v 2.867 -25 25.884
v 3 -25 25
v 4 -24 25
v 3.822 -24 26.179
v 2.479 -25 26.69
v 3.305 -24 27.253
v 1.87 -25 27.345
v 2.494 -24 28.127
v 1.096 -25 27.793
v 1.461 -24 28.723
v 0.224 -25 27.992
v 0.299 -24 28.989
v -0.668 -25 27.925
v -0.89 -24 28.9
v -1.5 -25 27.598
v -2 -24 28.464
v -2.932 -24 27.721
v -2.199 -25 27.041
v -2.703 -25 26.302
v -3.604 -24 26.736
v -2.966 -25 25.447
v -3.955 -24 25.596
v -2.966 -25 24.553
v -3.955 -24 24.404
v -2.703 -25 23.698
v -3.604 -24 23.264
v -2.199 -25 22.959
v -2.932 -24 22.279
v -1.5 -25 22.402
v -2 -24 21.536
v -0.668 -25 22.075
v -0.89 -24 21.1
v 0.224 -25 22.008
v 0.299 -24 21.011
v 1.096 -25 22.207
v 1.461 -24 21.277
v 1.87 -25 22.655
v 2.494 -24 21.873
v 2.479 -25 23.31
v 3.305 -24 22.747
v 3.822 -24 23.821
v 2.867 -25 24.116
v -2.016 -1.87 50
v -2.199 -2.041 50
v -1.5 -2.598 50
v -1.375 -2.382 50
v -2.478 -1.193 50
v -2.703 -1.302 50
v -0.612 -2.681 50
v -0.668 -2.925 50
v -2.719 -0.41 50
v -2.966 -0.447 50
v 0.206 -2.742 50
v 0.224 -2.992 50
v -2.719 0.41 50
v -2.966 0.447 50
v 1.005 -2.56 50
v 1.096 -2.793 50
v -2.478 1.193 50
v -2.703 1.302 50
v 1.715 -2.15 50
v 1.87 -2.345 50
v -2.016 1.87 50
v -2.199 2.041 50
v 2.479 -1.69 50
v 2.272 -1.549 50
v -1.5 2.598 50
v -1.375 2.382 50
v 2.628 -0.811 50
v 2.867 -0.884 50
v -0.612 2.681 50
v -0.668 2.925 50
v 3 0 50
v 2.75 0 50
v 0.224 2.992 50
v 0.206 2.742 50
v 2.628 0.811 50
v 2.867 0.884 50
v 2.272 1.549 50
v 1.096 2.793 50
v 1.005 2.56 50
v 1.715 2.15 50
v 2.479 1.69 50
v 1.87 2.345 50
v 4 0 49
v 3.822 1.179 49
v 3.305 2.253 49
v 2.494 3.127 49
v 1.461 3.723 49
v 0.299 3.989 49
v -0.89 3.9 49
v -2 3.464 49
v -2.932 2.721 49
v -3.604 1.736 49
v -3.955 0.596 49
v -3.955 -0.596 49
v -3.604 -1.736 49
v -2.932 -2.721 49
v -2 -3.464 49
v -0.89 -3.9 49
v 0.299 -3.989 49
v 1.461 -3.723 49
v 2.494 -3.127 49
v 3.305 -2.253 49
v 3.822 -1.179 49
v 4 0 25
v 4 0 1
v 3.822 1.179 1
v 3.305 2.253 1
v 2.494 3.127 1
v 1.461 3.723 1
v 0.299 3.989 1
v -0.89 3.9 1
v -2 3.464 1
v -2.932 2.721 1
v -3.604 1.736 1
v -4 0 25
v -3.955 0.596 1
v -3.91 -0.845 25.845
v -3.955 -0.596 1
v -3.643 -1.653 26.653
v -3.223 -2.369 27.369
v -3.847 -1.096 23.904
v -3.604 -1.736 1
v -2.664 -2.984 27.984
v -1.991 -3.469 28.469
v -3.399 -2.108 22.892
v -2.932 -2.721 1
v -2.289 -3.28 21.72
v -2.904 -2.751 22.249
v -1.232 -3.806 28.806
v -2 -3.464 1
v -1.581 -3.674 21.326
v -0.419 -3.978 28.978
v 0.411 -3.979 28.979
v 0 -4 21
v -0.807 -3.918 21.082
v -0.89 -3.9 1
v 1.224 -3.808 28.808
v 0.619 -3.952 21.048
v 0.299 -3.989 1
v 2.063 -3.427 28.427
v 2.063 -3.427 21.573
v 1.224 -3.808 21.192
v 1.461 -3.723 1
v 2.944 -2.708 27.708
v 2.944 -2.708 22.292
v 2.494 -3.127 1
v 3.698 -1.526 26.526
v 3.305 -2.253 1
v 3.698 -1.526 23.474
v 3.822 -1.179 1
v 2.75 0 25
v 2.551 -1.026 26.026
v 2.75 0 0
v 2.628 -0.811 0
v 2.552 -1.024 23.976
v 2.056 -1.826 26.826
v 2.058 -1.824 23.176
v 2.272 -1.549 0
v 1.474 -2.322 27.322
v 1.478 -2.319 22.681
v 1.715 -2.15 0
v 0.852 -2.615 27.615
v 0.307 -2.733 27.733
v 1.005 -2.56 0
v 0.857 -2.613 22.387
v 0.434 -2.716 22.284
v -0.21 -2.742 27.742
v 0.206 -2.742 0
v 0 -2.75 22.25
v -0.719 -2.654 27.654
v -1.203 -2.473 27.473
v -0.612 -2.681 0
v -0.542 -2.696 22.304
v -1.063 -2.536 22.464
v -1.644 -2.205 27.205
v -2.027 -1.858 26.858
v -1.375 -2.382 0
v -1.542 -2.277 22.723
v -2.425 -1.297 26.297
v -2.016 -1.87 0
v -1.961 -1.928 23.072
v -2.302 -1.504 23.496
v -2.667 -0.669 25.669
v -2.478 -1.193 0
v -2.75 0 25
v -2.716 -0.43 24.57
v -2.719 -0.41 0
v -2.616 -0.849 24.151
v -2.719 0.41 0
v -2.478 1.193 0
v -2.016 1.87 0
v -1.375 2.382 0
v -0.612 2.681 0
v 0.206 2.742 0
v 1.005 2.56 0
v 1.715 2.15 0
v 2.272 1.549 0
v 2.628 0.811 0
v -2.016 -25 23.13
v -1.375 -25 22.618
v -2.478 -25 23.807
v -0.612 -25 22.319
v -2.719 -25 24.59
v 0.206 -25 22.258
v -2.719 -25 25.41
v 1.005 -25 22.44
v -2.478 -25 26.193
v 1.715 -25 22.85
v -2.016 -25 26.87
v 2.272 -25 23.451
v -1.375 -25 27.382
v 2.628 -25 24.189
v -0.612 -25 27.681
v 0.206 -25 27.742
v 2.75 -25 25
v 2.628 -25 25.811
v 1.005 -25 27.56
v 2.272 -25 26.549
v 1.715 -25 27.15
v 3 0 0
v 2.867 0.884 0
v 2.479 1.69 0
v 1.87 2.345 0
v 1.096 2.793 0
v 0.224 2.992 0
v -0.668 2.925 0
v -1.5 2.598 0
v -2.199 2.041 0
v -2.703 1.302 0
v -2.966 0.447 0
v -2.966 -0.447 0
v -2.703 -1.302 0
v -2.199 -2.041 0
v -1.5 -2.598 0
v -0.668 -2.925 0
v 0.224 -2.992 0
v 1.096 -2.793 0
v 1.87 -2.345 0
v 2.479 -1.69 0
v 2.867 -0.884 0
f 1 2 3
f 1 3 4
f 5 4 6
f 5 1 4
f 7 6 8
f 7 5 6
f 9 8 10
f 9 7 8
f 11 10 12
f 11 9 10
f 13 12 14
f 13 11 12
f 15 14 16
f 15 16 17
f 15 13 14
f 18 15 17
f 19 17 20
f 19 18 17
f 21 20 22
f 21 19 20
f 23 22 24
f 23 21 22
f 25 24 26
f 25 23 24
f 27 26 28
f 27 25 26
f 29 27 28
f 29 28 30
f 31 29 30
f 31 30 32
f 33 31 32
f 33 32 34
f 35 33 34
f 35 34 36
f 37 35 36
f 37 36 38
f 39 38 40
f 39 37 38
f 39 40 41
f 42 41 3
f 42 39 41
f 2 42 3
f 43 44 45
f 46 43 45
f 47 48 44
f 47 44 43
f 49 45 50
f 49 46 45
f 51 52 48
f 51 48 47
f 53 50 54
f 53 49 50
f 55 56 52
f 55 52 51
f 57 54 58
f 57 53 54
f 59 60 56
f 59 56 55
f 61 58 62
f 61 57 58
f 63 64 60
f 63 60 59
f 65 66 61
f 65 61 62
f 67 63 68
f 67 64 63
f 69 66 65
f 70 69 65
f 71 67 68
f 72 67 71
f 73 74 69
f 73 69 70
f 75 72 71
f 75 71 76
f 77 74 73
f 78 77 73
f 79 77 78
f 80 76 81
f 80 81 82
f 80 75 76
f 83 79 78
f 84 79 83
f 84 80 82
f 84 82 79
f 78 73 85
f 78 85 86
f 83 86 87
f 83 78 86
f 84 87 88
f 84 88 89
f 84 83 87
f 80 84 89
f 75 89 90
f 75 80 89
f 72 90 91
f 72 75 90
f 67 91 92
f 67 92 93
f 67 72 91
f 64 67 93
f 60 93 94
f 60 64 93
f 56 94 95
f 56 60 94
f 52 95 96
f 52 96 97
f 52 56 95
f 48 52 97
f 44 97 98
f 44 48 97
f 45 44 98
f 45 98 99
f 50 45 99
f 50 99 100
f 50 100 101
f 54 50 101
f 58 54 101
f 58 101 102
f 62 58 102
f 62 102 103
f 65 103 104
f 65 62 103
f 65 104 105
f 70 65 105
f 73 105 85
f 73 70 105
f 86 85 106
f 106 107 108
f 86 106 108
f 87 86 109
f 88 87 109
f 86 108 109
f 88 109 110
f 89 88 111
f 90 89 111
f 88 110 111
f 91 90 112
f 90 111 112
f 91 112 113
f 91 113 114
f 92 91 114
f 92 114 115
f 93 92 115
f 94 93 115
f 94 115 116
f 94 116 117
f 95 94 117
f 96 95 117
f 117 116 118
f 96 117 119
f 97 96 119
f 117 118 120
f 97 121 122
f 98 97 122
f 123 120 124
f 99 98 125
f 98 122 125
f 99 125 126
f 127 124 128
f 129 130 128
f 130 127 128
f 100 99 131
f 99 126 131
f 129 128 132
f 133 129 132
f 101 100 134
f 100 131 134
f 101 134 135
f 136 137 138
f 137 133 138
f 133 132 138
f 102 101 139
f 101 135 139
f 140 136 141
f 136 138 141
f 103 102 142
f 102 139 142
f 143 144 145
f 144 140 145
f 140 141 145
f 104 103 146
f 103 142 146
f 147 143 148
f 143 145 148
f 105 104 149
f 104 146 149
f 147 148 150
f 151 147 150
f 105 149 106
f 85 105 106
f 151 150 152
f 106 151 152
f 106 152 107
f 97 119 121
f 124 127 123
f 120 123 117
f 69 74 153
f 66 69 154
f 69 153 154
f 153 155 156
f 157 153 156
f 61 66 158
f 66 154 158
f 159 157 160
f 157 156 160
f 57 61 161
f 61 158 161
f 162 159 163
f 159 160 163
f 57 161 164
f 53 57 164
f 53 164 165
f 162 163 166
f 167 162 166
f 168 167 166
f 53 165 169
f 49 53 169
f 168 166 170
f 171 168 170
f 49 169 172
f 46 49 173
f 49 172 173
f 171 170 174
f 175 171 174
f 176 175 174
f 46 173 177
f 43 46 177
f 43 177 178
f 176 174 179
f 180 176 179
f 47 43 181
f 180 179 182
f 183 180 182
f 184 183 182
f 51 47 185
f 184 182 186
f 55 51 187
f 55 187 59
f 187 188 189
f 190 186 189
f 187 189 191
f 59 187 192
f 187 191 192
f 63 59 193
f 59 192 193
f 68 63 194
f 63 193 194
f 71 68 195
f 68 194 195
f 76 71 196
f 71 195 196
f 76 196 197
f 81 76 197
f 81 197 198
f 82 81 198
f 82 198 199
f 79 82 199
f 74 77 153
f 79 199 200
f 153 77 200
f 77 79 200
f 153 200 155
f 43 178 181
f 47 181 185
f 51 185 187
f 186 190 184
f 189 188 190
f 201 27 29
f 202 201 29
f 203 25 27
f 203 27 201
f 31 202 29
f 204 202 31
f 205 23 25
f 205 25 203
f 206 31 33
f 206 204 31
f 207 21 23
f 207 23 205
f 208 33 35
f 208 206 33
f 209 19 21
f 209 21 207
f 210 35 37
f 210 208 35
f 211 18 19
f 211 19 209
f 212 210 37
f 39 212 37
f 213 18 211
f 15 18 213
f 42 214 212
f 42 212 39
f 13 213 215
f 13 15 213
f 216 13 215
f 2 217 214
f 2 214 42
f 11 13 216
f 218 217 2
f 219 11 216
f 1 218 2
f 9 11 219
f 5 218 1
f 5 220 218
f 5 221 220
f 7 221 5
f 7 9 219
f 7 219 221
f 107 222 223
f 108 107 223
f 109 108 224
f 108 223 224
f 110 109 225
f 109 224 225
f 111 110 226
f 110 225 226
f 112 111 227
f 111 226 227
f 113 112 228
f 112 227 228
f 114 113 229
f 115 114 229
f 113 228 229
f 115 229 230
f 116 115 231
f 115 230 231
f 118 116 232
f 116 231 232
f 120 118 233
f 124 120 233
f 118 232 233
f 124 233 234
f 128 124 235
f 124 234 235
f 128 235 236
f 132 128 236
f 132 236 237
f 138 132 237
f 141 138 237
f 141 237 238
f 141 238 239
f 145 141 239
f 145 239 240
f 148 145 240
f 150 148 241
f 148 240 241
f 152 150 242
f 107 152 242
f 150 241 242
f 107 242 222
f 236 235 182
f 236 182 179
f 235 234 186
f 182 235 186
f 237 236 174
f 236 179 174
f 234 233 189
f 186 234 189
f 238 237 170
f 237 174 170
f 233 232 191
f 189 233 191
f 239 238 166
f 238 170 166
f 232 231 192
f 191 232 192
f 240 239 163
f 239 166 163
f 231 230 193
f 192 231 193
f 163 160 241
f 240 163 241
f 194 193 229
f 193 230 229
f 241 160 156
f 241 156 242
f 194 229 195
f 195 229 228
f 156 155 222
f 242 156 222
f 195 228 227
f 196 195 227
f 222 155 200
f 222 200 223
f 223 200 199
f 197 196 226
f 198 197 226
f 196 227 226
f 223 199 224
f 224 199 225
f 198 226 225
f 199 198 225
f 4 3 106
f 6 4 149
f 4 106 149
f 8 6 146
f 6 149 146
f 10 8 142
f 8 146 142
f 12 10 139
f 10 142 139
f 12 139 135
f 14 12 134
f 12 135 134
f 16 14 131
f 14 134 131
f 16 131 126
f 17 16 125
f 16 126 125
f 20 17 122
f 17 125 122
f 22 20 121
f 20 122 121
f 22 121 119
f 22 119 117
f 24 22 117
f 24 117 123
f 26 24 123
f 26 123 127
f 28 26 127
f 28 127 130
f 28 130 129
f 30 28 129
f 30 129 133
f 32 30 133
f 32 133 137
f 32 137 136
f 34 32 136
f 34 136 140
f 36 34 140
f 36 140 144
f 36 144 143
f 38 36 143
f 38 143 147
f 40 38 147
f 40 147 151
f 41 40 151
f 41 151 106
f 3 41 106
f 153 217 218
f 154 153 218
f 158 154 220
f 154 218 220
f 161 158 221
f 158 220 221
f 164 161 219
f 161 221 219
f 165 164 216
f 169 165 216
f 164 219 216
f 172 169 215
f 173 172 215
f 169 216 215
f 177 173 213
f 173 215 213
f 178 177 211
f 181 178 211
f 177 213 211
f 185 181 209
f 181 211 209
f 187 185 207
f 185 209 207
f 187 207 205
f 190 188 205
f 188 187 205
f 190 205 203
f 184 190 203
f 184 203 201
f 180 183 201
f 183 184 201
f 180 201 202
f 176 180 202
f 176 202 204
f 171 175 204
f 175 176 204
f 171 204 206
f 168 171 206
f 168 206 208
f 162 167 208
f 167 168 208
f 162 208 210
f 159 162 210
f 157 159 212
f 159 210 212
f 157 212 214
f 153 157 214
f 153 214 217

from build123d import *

# Parameters (mm, degrees)
SKETCH_R        = 4
PAD_DEPTH       = 50
SKETCH001_R     = 4
PAD001_DEPTH    = 25
SKETCH002_R     = 2.75
POCKET_DEPTH    = 50.001
SKETCH003_R     = 2.75
POCKET001_DEPTH = 25
CHAMFER_SIZE    = 1


with BuildPart() as part:
    # Sketch → Pad (new body)
    with BuildSketch(Plane.XY):
        Circle(SKETCH_R)
    extrude(amount=PAD_DEPTH)

    # Sketch001 → Pad001 (join)
    with BuildSketch(Plane.XZ):
        with Locations((0, 25)):
            Circle(SKETCH001_R)
    extrude(amount=PAD001_DEPTH)

    # Sketch002 (on Face2 of Pad001) → Pocket (cut, through all)
    with BuildSketch(Plane(origin=(0, 0, 0), x_dir=(1, 0, 0), z_dir=(0, 0, -1))):
        Circle(SKETCH002_R)
    extrude(amount=-POCKET_DEPTH, mode=Mode.SUBTRACT)

    # Sketch003 (on Face6 of Pocket) → Pocket001 (cut)
    with BuildSketch(Plane.XZ.offset(25)):
        with Locations((0, 25)):
            Circle(SKETCH003_R)
    extrude(amount=-POCKET001_DEPTH, mode=Mode.SUBTRACT)

    # Chamfer
    chamfer_edges = [part.edges().sort_by_distance(p)[0] for p in [
        (-4, 0, 0),
        (-4, -25, 25),
        (-4, 0, 50),
    ]]
    chamfer(chamfer_edges, length=CHAMFER_SIZE)


solid = part.part
